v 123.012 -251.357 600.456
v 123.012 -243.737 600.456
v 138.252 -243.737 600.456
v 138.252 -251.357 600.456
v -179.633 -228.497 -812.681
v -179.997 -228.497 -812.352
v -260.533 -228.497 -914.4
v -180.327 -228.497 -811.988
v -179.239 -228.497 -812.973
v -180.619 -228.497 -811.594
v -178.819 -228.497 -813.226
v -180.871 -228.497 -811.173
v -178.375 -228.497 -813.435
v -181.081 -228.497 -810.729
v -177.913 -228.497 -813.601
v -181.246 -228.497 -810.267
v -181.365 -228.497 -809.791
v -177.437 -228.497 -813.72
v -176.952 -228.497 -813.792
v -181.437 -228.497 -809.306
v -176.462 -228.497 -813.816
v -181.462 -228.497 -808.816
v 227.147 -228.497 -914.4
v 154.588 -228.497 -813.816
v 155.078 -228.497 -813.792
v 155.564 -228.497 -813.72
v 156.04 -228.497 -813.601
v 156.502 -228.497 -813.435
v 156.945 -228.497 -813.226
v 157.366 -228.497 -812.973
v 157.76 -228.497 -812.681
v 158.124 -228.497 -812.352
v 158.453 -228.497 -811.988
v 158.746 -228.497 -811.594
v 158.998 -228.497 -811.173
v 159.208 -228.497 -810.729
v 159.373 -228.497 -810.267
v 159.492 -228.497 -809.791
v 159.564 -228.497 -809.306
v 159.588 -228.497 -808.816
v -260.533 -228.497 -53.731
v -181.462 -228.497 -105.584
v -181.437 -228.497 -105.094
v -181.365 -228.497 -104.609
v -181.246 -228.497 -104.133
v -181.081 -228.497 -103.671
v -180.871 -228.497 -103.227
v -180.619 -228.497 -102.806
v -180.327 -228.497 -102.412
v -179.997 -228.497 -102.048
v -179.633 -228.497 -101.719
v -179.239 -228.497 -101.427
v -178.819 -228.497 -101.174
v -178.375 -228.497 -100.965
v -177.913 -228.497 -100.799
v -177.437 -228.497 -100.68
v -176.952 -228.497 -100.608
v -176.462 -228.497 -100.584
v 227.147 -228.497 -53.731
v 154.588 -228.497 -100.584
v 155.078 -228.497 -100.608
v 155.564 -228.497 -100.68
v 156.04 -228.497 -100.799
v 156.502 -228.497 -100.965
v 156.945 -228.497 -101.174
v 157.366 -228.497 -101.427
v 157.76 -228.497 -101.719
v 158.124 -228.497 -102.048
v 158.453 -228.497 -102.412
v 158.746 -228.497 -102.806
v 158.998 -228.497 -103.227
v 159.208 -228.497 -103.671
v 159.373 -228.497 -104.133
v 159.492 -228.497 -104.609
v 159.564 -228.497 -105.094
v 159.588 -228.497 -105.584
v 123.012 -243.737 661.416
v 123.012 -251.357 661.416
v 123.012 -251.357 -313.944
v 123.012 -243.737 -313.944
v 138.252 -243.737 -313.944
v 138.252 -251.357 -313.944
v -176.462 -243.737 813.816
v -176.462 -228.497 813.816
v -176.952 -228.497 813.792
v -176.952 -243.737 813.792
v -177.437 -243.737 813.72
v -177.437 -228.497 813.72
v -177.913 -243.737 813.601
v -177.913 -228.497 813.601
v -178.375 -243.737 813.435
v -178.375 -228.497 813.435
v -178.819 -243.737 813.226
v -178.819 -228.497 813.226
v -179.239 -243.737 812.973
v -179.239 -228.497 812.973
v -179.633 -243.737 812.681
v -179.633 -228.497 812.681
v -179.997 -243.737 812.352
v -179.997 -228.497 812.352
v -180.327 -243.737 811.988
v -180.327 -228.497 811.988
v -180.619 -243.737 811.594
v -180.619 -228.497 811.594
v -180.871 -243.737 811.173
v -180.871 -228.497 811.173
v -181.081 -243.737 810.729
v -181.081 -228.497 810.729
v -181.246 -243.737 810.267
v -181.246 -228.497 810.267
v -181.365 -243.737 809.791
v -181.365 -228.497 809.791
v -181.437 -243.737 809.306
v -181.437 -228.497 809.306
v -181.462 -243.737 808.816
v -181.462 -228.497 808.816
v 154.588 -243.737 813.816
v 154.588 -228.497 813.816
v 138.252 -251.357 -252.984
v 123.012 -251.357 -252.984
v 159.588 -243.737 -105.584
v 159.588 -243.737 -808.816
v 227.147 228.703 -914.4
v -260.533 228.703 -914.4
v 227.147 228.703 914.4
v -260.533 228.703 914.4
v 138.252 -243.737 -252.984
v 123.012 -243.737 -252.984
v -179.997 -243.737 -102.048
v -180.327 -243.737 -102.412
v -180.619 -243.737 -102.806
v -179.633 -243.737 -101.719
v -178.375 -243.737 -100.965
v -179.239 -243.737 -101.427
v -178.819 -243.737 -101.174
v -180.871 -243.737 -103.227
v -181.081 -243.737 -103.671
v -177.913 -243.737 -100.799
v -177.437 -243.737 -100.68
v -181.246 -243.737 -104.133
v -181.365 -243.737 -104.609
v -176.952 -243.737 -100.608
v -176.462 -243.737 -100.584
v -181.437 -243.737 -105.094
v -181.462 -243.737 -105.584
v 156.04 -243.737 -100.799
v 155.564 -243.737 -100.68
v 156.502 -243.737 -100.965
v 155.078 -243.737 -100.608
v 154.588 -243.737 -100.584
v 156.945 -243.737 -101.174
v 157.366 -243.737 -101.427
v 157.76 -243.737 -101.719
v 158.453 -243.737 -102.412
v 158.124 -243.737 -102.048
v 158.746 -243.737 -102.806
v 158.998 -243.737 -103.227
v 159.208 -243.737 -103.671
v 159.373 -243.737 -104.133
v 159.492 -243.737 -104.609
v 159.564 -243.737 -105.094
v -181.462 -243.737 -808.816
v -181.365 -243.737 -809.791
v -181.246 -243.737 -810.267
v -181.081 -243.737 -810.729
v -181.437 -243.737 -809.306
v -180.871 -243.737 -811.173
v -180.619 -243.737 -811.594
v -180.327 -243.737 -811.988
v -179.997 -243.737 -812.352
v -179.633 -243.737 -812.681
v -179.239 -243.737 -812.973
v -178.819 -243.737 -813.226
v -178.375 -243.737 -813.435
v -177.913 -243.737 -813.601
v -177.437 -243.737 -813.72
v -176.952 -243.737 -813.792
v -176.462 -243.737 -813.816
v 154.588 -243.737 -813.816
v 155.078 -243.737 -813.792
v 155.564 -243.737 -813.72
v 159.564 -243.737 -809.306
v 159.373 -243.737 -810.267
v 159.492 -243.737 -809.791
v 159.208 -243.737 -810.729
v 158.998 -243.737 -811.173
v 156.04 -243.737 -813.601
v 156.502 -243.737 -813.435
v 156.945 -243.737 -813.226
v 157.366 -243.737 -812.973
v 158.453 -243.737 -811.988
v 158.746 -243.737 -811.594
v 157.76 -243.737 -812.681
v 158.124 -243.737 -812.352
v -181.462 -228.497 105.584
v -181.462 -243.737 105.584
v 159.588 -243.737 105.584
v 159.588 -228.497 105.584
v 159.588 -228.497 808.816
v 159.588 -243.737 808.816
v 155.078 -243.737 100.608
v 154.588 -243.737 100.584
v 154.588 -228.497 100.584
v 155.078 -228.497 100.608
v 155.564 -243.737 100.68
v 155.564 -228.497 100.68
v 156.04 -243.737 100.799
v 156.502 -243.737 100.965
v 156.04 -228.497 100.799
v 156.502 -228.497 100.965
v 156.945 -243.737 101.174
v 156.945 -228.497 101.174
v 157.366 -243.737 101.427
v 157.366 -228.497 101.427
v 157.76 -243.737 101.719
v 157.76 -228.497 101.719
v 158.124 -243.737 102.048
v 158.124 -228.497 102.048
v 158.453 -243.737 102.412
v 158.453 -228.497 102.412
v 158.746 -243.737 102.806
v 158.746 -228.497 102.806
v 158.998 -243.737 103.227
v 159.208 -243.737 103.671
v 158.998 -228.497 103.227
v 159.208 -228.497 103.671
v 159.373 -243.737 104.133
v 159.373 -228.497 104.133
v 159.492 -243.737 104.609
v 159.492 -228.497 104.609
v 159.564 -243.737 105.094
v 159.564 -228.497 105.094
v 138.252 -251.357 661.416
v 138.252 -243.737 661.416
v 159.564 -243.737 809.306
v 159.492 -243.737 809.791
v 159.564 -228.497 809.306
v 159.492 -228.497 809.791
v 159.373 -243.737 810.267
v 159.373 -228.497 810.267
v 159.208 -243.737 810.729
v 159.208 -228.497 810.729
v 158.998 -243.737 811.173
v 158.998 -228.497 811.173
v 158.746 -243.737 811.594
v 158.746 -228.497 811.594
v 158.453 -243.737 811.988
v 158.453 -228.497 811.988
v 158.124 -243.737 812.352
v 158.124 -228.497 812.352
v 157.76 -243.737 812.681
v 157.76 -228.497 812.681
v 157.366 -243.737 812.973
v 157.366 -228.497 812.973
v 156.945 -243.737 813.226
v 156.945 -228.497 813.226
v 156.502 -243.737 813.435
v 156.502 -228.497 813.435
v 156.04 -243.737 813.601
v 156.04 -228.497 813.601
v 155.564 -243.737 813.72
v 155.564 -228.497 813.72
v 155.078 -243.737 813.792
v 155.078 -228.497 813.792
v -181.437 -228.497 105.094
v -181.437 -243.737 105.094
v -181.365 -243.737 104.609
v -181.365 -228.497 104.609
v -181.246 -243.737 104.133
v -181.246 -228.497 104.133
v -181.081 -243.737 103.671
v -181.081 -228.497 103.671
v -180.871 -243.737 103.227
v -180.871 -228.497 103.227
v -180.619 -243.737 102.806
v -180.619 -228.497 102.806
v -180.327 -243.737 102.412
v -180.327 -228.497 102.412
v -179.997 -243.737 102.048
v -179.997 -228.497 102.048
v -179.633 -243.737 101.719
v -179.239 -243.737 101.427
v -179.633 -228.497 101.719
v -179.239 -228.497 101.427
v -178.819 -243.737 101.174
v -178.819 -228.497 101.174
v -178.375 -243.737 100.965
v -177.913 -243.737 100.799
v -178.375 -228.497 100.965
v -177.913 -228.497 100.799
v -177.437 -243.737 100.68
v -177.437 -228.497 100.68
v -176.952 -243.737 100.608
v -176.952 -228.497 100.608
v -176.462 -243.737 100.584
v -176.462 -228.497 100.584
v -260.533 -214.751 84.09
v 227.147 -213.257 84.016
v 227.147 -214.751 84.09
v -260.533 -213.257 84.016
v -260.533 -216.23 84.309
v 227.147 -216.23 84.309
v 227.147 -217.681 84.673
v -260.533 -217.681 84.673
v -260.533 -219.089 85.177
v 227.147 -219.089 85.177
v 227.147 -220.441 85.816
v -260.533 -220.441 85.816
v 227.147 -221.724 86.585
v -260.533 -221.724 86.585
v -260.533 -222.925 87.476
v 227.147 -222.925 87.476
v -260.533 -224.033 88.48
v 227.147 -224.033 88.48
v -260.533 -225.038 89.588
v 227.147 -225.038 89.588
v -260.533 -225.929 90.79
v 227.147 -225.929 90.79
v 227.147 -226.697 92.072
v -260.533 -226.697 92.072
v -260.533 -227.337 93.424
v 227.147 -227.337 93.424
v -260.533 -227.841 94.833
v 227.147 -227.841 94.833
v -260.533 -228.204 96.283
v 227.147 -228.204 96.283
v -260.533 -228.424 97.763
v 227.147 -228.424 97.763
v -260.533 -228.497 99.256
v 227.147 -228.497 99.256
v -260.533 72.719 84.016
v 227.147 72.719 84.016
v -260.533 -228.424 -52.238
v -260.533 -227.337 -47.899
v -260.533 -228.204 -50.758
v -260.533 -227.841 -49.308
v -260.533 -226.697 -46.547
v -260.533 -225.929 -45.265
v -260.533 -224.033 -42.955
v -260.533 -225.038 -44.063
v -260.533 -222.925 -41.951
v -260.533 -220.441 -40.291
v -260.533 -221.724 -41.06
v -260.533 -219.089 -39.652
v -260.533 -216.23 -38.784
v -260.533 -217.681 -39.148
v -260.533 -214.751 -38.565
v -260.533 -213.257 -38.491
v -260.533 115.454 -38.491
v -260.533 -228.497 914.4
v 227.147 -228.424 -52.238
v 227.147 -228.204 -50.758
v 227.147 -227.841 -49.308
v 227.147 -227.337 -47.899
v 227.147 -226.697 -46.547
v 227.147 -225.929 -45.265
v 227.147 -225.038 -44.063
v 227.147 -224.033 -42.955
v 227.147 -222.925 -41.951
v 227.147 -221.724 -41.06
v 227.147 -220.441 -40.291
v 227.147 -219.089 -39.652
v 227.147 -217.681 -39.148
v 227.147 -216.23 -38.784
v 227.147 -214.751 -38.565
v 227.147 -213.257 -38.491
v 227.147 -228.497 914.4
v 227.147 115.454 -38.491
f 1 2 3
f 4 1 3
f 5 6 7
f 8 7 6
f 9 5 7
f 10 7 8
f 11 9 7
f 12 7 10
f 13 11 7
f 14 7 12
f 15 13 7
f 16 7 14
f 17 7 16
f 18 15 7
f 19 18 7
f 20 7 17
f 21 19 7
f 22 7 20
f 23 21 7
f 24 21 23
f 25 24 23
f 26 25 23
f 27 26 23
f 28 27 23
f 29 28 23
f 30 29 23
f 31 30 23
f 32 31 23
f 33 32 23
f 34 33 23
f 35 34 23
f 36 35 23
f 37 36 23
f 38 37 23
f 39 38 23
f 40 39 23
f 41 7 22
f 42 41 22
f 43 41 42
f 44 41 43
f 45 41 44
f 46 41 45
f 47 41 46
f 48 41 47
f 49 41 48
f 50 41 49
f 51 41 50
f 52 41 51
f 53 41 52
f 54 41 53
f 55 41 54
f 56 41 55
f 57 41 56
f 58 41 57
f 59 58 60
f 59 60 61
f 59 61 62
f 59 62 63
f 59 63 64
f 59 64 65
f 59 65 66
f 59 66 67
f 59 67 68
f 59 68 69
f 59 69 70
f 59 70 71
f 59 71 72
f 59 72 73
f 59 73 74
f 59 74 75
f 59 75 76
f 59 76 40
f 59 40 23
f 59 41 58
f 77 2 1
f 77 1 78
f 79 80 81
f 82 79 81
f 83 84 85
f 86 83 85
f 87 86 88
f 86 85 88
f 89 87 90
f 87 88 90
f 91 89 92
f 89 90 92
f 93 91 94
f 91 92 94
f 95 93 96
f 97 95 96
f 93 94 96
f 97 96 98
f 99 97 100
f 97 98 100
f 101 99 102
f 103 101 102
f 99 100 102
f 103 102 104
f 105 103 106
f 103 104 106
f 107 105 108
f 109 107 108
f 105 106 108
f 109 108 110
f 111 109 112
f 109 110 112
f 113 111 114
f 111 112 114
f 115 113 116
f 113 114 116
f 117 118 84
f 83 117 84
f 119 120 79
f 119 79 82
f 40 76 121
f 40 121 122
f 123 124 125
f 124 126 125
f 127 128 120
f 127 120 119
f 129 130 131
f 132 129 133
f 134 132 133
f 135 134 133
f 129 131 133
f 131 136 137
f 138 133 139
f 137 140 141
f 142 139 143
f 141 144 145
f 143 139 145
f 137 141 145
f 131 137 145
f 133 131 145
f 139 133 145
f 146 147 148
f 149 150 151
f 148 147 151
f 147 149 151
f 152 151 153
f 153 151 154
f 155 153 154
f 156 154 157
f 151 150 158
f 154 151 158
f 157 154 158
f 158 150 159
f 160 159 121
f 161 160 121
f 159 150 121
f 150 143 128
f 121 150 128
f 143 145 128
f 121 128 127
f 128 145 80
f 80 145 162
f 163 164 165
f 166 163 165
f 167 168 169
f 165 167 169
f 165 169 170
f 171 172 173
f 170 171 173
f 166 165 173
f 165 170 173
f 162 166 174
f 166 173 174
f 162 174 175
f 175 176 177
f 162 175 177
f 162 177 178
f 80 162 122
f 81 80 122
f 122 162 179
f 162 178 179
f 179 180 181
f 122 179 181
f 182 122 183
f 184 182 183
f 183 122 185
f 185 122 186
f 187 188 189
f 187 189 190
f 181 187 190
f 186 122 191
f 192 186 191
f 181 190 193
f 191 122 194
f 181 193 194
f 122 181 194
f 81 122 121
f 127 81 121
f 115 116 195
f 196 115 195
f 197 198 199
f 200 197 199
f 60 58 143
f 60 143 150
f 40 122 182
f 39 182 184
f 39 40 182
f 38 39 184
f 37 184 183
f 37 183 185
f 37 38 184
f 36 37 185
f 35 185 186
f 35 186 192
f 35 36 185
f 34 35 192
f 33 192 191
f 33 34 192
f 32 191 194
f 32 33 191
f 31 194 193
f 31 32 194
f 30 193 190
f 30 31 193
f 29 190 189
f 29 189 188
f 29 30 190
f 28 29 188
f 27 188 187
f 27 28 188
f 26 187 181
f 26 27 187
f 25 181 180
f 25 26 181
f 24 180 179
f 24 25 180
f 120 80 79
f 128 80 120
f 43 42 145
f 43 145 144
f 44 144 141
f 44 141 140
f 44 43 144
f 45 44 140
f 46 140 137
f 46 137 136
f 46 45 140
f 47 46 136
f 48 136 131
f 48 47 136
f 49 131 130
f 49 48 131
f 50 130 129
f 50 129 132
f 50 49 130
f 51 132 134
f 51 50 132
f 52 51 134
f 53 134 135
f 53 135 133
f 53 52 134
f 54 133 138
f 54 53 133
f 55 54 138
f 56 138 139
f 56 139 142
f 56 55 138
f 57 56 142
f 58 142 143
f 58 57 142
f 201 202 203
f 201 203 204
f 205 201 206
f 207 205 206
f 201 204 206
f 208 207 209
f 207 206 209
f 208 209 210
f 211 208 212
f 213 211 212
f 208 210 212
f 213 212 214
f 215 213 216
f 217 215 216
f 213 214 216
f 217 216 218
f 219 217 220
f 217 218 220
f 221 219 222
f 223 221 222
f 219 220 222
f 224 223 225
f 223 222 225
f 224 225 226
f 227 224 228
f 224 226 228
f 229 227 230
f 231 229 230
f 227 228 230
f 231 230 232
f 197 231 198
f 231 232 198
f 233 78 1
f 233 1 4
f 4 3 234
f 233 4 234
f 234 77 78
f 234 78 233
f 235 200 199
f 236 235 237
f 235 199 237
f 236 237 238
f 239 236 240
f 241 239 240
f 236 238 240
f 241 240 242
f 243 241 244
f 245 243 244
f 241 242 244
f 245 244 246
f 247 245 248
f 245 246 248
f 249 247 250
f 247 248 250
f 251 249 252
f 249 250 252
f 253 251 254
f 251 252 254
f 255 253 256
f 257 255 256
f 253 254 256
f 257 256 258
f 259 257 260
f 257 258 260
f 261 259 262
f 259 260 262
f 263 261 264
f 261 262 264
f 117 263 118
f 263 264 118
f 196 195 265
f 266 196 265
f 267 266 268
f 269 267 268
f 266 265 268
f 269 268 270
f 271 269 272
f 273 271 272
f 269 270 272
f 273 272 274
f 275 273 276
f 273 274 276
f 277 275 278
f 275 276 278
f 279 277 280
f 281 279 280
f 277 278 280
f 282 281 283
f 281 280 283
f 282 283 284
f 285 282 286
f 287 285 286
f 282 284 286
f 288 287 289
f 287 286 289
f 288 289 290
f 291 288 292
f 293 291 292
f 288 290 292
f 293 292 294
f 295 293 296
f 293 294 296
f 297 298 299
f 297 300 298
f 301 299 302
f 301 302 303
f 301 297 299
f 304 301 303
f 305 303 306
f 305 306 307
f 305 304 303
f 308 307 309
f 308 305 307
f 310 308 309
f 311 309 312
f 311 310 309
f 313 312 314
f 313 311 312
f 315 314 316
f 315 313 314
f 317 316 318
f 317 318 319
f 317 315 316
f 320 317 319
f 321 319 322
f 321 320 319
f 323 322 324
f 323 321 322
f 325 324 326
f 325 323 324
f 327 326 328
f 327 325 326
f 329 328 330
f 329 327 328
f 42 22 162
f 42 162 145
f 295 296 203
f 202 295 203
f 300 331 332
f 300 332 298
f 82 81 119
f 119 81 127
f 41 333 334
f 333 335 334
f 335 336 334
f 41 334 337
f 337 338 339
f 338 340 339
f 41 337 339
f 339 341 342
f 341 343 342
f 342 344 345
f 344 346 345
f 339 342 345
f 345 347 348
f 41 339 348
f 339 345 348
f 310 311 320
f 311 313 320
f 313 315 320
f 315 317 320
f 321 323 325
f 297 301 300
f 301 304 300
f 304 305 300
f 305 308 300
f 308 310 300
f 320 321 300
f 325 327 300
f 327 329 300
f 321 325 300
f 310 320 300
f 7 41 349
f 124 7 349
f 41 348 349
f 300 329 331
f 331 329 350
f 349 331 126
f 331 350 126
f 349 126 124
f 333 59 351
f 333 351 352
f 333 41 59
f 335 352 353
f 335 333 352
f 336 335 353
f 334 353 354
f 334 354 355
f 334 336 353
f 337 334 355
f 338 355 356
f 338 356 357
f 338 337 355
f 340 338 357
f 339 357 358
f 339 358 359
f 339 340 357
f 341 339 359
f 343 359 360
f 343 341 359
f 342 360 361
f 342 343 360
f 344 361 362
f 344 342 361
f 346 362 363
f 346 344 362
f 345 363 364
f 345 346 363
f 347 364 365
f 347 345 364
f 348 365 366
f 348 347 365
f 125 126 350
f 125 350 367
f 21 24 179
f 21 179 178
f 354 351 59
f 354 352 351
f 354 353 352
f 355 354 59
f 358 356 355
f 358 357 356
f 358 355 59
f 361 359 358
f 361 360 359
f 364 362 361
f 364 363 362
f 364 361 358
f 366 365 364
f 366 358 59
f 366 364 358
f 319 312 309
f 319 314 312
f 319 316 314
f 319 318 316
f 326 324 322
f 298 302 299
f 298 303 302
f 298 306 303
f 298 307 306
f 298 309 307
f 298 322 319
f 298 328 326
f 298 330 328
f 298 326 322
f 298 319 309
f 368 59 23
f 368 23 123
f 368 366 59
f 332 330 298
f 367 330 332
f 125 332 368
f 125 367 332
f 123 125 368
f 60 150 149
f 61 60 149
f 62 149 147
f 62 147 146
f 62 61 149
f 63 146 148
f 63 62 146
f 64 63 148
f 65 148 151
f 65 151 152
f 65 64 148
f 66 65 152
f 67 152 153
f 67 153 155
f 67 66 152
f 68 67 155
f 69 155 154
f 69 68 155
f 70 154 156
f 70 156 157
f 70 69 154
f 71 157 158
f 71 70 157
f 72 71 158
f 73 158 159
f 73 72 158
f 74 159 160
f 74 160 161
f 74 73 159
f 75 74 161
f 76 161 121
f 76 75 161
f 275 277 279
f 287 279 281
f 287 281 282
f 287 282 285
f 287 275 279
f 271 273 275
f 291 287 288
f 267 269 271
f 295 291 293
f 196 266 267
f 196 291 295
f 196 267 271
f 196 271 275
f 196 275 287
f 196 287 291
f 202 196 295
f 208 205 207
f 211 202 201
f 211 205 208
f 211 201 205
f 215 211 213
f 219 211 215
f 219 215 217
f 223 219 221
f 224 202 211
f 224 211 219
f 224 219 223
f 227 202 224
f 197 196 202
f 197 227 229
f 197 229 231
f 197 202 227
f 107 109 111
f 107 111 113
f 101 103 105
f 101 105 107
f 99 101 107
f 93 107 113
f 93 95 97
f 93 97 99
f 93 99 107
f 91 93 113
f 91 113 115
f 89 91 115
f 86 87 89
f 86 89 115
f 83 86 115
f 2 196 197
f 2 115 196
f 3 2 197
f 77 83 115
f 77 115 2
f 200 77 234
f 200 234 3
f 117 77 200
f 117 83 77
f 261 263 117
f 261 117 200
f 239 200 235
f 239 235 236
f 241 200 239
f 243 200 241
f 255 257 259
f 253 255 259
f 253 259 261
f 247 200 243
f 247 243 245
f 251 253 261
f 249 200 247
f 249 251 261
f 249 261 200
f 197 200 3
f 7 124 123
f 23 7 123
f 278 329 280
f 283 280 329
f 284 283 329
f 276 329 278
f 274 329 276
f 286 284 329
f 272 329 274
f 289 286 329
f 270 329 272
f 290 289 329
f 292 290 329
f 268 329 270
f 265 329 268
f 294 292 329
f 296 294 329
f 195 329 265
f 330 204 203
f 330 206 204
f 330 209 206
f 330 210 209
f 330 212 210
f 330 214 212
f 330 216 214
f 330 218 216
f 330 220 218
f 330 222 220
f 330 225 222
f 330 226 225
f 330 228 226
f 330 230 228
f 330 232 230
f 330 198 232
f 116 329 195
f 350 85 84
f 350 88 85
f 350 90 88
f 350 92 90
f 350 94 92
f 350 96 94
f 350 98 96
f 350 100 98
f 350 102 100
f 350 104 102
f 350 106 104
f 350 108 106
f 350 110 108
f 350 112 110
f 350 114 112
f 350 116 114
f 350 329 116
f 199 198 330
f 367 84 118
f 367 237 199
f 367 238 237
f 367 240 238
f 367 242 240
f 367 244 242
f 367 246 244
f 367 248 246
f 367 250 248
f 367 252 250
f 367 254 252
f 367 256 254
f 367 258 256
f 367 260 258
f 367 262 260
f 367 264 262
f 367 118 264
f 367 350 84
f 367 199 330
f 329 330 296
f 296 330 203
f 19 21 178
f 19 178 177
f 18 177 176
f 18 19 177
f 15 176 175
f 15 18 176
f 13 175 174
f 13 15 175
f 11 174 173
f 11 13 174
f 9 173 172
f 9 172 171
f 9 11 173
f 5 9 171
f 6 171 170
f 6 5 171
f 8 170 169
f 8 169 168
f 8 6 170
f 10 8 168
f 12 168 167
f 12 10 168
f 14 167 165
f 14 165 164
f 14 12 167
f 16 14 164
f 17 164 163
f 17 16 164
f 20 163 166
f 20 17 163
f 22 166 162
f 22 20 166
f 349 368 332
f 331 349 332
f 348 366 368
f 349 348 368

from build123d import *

# Parameters (mm, degrees)
F0_W     = 487.68
F0_H     = 457.2
F1_DEPTH = 914.4
F3_DEPTH = 15.24
F5_W     = 15.24
F5_H     = 60.96
F6_DEPTH = 7.62
F8_DEPTH = 487.68
F9_R     = 15.24


with BuildPart() as f1:
    # F0 (on Top) → F1 (new body)
    with BuildSketch(Plane.XY):
        with Locations((-16.6927352548, 0.1030346877)):
            Rectangle(F0_W, F0_H)
    extrude(amount=F1_DEPTH)

    # F2 (on face) → F3 (join)
    with BuildSketch(Plane.XZ.offset(228.4969653123)):
        with BuildLine():
            ThreePointArc((-181.4615279436, 105.584), (-179.9970618495, 102.0484660941), (-176.4615279436, 100.584))
            Line((-176.4615279436, 100.584), (154.5883071423, 100.584))
            ThreePointArc((154.5883071423, 100.584), (158.1238410482, 102.0484660941), (159.5883071423, 105.584))
            Line((159.5883071423, 105.584), (159.5883071423, 808.816))
            ThreePointArc((159.5883071423, 808.816), (158.1238410482, 812.3515339059), (154.5883071423, 813.816))
            Line((154.5883071423, 813.816), (-176.4615279436, 813.816))
            ThreePointArc((-176.4615279436, 813.816), (-179.9970618495, 812.3515339059), (-181.4615279436, 808.816))
            Line((-181.4615279436, 808.816), (-181.4615279436, 105.584))
        make_face()
    extrude(amount=F3_DEPTH)

    # F4: F1 across face


with BuildPart() as f1_1:
    add(f1.part)
    add(f1.part.mirror(Plane(origin=(-16.6927352548, 0.1030346877, 0), x_dir=(1, 0, 0), z_dir=(0, 0, -1))))

    # F5 (on face) → F6 (join)
    with BuildSketch(Plane.XZ.offset(243.7369653123)):
        with Locations((130.6323071423, 630.936)):
            Rectangle(F5_W, F5_H)
        with Locations((130.6323071423, -283.464)):
            Rectangle(F5_W, F5_H)
    extrude(amount=F6_DEPTH)

    # F7 (on face) → F8 (cut)
    with BuildSketch(Plane.YZ.offset(227.1472647452)):
        Polygon((72.7191716433, 84.0164422989), (-228.4969653123, 84.0164422989), (-228.4969653123, -38.4914465249), (115.4544577003, -38.4914465249), align=None)
    extrude(amount=-F8_DEPTH, mode=Mode.SUBTRACT)

    # F9
    f9_edges = [f1_1.edges().sort_by_distance(p)[0] for p in [
        (-16.692735, -228.496965, -38.491447),
        (-16.692735, -228.496965, 84.016442),
    ]]
    fillet(f9_edges, radius=F9_R)


solid = f1_1.part
